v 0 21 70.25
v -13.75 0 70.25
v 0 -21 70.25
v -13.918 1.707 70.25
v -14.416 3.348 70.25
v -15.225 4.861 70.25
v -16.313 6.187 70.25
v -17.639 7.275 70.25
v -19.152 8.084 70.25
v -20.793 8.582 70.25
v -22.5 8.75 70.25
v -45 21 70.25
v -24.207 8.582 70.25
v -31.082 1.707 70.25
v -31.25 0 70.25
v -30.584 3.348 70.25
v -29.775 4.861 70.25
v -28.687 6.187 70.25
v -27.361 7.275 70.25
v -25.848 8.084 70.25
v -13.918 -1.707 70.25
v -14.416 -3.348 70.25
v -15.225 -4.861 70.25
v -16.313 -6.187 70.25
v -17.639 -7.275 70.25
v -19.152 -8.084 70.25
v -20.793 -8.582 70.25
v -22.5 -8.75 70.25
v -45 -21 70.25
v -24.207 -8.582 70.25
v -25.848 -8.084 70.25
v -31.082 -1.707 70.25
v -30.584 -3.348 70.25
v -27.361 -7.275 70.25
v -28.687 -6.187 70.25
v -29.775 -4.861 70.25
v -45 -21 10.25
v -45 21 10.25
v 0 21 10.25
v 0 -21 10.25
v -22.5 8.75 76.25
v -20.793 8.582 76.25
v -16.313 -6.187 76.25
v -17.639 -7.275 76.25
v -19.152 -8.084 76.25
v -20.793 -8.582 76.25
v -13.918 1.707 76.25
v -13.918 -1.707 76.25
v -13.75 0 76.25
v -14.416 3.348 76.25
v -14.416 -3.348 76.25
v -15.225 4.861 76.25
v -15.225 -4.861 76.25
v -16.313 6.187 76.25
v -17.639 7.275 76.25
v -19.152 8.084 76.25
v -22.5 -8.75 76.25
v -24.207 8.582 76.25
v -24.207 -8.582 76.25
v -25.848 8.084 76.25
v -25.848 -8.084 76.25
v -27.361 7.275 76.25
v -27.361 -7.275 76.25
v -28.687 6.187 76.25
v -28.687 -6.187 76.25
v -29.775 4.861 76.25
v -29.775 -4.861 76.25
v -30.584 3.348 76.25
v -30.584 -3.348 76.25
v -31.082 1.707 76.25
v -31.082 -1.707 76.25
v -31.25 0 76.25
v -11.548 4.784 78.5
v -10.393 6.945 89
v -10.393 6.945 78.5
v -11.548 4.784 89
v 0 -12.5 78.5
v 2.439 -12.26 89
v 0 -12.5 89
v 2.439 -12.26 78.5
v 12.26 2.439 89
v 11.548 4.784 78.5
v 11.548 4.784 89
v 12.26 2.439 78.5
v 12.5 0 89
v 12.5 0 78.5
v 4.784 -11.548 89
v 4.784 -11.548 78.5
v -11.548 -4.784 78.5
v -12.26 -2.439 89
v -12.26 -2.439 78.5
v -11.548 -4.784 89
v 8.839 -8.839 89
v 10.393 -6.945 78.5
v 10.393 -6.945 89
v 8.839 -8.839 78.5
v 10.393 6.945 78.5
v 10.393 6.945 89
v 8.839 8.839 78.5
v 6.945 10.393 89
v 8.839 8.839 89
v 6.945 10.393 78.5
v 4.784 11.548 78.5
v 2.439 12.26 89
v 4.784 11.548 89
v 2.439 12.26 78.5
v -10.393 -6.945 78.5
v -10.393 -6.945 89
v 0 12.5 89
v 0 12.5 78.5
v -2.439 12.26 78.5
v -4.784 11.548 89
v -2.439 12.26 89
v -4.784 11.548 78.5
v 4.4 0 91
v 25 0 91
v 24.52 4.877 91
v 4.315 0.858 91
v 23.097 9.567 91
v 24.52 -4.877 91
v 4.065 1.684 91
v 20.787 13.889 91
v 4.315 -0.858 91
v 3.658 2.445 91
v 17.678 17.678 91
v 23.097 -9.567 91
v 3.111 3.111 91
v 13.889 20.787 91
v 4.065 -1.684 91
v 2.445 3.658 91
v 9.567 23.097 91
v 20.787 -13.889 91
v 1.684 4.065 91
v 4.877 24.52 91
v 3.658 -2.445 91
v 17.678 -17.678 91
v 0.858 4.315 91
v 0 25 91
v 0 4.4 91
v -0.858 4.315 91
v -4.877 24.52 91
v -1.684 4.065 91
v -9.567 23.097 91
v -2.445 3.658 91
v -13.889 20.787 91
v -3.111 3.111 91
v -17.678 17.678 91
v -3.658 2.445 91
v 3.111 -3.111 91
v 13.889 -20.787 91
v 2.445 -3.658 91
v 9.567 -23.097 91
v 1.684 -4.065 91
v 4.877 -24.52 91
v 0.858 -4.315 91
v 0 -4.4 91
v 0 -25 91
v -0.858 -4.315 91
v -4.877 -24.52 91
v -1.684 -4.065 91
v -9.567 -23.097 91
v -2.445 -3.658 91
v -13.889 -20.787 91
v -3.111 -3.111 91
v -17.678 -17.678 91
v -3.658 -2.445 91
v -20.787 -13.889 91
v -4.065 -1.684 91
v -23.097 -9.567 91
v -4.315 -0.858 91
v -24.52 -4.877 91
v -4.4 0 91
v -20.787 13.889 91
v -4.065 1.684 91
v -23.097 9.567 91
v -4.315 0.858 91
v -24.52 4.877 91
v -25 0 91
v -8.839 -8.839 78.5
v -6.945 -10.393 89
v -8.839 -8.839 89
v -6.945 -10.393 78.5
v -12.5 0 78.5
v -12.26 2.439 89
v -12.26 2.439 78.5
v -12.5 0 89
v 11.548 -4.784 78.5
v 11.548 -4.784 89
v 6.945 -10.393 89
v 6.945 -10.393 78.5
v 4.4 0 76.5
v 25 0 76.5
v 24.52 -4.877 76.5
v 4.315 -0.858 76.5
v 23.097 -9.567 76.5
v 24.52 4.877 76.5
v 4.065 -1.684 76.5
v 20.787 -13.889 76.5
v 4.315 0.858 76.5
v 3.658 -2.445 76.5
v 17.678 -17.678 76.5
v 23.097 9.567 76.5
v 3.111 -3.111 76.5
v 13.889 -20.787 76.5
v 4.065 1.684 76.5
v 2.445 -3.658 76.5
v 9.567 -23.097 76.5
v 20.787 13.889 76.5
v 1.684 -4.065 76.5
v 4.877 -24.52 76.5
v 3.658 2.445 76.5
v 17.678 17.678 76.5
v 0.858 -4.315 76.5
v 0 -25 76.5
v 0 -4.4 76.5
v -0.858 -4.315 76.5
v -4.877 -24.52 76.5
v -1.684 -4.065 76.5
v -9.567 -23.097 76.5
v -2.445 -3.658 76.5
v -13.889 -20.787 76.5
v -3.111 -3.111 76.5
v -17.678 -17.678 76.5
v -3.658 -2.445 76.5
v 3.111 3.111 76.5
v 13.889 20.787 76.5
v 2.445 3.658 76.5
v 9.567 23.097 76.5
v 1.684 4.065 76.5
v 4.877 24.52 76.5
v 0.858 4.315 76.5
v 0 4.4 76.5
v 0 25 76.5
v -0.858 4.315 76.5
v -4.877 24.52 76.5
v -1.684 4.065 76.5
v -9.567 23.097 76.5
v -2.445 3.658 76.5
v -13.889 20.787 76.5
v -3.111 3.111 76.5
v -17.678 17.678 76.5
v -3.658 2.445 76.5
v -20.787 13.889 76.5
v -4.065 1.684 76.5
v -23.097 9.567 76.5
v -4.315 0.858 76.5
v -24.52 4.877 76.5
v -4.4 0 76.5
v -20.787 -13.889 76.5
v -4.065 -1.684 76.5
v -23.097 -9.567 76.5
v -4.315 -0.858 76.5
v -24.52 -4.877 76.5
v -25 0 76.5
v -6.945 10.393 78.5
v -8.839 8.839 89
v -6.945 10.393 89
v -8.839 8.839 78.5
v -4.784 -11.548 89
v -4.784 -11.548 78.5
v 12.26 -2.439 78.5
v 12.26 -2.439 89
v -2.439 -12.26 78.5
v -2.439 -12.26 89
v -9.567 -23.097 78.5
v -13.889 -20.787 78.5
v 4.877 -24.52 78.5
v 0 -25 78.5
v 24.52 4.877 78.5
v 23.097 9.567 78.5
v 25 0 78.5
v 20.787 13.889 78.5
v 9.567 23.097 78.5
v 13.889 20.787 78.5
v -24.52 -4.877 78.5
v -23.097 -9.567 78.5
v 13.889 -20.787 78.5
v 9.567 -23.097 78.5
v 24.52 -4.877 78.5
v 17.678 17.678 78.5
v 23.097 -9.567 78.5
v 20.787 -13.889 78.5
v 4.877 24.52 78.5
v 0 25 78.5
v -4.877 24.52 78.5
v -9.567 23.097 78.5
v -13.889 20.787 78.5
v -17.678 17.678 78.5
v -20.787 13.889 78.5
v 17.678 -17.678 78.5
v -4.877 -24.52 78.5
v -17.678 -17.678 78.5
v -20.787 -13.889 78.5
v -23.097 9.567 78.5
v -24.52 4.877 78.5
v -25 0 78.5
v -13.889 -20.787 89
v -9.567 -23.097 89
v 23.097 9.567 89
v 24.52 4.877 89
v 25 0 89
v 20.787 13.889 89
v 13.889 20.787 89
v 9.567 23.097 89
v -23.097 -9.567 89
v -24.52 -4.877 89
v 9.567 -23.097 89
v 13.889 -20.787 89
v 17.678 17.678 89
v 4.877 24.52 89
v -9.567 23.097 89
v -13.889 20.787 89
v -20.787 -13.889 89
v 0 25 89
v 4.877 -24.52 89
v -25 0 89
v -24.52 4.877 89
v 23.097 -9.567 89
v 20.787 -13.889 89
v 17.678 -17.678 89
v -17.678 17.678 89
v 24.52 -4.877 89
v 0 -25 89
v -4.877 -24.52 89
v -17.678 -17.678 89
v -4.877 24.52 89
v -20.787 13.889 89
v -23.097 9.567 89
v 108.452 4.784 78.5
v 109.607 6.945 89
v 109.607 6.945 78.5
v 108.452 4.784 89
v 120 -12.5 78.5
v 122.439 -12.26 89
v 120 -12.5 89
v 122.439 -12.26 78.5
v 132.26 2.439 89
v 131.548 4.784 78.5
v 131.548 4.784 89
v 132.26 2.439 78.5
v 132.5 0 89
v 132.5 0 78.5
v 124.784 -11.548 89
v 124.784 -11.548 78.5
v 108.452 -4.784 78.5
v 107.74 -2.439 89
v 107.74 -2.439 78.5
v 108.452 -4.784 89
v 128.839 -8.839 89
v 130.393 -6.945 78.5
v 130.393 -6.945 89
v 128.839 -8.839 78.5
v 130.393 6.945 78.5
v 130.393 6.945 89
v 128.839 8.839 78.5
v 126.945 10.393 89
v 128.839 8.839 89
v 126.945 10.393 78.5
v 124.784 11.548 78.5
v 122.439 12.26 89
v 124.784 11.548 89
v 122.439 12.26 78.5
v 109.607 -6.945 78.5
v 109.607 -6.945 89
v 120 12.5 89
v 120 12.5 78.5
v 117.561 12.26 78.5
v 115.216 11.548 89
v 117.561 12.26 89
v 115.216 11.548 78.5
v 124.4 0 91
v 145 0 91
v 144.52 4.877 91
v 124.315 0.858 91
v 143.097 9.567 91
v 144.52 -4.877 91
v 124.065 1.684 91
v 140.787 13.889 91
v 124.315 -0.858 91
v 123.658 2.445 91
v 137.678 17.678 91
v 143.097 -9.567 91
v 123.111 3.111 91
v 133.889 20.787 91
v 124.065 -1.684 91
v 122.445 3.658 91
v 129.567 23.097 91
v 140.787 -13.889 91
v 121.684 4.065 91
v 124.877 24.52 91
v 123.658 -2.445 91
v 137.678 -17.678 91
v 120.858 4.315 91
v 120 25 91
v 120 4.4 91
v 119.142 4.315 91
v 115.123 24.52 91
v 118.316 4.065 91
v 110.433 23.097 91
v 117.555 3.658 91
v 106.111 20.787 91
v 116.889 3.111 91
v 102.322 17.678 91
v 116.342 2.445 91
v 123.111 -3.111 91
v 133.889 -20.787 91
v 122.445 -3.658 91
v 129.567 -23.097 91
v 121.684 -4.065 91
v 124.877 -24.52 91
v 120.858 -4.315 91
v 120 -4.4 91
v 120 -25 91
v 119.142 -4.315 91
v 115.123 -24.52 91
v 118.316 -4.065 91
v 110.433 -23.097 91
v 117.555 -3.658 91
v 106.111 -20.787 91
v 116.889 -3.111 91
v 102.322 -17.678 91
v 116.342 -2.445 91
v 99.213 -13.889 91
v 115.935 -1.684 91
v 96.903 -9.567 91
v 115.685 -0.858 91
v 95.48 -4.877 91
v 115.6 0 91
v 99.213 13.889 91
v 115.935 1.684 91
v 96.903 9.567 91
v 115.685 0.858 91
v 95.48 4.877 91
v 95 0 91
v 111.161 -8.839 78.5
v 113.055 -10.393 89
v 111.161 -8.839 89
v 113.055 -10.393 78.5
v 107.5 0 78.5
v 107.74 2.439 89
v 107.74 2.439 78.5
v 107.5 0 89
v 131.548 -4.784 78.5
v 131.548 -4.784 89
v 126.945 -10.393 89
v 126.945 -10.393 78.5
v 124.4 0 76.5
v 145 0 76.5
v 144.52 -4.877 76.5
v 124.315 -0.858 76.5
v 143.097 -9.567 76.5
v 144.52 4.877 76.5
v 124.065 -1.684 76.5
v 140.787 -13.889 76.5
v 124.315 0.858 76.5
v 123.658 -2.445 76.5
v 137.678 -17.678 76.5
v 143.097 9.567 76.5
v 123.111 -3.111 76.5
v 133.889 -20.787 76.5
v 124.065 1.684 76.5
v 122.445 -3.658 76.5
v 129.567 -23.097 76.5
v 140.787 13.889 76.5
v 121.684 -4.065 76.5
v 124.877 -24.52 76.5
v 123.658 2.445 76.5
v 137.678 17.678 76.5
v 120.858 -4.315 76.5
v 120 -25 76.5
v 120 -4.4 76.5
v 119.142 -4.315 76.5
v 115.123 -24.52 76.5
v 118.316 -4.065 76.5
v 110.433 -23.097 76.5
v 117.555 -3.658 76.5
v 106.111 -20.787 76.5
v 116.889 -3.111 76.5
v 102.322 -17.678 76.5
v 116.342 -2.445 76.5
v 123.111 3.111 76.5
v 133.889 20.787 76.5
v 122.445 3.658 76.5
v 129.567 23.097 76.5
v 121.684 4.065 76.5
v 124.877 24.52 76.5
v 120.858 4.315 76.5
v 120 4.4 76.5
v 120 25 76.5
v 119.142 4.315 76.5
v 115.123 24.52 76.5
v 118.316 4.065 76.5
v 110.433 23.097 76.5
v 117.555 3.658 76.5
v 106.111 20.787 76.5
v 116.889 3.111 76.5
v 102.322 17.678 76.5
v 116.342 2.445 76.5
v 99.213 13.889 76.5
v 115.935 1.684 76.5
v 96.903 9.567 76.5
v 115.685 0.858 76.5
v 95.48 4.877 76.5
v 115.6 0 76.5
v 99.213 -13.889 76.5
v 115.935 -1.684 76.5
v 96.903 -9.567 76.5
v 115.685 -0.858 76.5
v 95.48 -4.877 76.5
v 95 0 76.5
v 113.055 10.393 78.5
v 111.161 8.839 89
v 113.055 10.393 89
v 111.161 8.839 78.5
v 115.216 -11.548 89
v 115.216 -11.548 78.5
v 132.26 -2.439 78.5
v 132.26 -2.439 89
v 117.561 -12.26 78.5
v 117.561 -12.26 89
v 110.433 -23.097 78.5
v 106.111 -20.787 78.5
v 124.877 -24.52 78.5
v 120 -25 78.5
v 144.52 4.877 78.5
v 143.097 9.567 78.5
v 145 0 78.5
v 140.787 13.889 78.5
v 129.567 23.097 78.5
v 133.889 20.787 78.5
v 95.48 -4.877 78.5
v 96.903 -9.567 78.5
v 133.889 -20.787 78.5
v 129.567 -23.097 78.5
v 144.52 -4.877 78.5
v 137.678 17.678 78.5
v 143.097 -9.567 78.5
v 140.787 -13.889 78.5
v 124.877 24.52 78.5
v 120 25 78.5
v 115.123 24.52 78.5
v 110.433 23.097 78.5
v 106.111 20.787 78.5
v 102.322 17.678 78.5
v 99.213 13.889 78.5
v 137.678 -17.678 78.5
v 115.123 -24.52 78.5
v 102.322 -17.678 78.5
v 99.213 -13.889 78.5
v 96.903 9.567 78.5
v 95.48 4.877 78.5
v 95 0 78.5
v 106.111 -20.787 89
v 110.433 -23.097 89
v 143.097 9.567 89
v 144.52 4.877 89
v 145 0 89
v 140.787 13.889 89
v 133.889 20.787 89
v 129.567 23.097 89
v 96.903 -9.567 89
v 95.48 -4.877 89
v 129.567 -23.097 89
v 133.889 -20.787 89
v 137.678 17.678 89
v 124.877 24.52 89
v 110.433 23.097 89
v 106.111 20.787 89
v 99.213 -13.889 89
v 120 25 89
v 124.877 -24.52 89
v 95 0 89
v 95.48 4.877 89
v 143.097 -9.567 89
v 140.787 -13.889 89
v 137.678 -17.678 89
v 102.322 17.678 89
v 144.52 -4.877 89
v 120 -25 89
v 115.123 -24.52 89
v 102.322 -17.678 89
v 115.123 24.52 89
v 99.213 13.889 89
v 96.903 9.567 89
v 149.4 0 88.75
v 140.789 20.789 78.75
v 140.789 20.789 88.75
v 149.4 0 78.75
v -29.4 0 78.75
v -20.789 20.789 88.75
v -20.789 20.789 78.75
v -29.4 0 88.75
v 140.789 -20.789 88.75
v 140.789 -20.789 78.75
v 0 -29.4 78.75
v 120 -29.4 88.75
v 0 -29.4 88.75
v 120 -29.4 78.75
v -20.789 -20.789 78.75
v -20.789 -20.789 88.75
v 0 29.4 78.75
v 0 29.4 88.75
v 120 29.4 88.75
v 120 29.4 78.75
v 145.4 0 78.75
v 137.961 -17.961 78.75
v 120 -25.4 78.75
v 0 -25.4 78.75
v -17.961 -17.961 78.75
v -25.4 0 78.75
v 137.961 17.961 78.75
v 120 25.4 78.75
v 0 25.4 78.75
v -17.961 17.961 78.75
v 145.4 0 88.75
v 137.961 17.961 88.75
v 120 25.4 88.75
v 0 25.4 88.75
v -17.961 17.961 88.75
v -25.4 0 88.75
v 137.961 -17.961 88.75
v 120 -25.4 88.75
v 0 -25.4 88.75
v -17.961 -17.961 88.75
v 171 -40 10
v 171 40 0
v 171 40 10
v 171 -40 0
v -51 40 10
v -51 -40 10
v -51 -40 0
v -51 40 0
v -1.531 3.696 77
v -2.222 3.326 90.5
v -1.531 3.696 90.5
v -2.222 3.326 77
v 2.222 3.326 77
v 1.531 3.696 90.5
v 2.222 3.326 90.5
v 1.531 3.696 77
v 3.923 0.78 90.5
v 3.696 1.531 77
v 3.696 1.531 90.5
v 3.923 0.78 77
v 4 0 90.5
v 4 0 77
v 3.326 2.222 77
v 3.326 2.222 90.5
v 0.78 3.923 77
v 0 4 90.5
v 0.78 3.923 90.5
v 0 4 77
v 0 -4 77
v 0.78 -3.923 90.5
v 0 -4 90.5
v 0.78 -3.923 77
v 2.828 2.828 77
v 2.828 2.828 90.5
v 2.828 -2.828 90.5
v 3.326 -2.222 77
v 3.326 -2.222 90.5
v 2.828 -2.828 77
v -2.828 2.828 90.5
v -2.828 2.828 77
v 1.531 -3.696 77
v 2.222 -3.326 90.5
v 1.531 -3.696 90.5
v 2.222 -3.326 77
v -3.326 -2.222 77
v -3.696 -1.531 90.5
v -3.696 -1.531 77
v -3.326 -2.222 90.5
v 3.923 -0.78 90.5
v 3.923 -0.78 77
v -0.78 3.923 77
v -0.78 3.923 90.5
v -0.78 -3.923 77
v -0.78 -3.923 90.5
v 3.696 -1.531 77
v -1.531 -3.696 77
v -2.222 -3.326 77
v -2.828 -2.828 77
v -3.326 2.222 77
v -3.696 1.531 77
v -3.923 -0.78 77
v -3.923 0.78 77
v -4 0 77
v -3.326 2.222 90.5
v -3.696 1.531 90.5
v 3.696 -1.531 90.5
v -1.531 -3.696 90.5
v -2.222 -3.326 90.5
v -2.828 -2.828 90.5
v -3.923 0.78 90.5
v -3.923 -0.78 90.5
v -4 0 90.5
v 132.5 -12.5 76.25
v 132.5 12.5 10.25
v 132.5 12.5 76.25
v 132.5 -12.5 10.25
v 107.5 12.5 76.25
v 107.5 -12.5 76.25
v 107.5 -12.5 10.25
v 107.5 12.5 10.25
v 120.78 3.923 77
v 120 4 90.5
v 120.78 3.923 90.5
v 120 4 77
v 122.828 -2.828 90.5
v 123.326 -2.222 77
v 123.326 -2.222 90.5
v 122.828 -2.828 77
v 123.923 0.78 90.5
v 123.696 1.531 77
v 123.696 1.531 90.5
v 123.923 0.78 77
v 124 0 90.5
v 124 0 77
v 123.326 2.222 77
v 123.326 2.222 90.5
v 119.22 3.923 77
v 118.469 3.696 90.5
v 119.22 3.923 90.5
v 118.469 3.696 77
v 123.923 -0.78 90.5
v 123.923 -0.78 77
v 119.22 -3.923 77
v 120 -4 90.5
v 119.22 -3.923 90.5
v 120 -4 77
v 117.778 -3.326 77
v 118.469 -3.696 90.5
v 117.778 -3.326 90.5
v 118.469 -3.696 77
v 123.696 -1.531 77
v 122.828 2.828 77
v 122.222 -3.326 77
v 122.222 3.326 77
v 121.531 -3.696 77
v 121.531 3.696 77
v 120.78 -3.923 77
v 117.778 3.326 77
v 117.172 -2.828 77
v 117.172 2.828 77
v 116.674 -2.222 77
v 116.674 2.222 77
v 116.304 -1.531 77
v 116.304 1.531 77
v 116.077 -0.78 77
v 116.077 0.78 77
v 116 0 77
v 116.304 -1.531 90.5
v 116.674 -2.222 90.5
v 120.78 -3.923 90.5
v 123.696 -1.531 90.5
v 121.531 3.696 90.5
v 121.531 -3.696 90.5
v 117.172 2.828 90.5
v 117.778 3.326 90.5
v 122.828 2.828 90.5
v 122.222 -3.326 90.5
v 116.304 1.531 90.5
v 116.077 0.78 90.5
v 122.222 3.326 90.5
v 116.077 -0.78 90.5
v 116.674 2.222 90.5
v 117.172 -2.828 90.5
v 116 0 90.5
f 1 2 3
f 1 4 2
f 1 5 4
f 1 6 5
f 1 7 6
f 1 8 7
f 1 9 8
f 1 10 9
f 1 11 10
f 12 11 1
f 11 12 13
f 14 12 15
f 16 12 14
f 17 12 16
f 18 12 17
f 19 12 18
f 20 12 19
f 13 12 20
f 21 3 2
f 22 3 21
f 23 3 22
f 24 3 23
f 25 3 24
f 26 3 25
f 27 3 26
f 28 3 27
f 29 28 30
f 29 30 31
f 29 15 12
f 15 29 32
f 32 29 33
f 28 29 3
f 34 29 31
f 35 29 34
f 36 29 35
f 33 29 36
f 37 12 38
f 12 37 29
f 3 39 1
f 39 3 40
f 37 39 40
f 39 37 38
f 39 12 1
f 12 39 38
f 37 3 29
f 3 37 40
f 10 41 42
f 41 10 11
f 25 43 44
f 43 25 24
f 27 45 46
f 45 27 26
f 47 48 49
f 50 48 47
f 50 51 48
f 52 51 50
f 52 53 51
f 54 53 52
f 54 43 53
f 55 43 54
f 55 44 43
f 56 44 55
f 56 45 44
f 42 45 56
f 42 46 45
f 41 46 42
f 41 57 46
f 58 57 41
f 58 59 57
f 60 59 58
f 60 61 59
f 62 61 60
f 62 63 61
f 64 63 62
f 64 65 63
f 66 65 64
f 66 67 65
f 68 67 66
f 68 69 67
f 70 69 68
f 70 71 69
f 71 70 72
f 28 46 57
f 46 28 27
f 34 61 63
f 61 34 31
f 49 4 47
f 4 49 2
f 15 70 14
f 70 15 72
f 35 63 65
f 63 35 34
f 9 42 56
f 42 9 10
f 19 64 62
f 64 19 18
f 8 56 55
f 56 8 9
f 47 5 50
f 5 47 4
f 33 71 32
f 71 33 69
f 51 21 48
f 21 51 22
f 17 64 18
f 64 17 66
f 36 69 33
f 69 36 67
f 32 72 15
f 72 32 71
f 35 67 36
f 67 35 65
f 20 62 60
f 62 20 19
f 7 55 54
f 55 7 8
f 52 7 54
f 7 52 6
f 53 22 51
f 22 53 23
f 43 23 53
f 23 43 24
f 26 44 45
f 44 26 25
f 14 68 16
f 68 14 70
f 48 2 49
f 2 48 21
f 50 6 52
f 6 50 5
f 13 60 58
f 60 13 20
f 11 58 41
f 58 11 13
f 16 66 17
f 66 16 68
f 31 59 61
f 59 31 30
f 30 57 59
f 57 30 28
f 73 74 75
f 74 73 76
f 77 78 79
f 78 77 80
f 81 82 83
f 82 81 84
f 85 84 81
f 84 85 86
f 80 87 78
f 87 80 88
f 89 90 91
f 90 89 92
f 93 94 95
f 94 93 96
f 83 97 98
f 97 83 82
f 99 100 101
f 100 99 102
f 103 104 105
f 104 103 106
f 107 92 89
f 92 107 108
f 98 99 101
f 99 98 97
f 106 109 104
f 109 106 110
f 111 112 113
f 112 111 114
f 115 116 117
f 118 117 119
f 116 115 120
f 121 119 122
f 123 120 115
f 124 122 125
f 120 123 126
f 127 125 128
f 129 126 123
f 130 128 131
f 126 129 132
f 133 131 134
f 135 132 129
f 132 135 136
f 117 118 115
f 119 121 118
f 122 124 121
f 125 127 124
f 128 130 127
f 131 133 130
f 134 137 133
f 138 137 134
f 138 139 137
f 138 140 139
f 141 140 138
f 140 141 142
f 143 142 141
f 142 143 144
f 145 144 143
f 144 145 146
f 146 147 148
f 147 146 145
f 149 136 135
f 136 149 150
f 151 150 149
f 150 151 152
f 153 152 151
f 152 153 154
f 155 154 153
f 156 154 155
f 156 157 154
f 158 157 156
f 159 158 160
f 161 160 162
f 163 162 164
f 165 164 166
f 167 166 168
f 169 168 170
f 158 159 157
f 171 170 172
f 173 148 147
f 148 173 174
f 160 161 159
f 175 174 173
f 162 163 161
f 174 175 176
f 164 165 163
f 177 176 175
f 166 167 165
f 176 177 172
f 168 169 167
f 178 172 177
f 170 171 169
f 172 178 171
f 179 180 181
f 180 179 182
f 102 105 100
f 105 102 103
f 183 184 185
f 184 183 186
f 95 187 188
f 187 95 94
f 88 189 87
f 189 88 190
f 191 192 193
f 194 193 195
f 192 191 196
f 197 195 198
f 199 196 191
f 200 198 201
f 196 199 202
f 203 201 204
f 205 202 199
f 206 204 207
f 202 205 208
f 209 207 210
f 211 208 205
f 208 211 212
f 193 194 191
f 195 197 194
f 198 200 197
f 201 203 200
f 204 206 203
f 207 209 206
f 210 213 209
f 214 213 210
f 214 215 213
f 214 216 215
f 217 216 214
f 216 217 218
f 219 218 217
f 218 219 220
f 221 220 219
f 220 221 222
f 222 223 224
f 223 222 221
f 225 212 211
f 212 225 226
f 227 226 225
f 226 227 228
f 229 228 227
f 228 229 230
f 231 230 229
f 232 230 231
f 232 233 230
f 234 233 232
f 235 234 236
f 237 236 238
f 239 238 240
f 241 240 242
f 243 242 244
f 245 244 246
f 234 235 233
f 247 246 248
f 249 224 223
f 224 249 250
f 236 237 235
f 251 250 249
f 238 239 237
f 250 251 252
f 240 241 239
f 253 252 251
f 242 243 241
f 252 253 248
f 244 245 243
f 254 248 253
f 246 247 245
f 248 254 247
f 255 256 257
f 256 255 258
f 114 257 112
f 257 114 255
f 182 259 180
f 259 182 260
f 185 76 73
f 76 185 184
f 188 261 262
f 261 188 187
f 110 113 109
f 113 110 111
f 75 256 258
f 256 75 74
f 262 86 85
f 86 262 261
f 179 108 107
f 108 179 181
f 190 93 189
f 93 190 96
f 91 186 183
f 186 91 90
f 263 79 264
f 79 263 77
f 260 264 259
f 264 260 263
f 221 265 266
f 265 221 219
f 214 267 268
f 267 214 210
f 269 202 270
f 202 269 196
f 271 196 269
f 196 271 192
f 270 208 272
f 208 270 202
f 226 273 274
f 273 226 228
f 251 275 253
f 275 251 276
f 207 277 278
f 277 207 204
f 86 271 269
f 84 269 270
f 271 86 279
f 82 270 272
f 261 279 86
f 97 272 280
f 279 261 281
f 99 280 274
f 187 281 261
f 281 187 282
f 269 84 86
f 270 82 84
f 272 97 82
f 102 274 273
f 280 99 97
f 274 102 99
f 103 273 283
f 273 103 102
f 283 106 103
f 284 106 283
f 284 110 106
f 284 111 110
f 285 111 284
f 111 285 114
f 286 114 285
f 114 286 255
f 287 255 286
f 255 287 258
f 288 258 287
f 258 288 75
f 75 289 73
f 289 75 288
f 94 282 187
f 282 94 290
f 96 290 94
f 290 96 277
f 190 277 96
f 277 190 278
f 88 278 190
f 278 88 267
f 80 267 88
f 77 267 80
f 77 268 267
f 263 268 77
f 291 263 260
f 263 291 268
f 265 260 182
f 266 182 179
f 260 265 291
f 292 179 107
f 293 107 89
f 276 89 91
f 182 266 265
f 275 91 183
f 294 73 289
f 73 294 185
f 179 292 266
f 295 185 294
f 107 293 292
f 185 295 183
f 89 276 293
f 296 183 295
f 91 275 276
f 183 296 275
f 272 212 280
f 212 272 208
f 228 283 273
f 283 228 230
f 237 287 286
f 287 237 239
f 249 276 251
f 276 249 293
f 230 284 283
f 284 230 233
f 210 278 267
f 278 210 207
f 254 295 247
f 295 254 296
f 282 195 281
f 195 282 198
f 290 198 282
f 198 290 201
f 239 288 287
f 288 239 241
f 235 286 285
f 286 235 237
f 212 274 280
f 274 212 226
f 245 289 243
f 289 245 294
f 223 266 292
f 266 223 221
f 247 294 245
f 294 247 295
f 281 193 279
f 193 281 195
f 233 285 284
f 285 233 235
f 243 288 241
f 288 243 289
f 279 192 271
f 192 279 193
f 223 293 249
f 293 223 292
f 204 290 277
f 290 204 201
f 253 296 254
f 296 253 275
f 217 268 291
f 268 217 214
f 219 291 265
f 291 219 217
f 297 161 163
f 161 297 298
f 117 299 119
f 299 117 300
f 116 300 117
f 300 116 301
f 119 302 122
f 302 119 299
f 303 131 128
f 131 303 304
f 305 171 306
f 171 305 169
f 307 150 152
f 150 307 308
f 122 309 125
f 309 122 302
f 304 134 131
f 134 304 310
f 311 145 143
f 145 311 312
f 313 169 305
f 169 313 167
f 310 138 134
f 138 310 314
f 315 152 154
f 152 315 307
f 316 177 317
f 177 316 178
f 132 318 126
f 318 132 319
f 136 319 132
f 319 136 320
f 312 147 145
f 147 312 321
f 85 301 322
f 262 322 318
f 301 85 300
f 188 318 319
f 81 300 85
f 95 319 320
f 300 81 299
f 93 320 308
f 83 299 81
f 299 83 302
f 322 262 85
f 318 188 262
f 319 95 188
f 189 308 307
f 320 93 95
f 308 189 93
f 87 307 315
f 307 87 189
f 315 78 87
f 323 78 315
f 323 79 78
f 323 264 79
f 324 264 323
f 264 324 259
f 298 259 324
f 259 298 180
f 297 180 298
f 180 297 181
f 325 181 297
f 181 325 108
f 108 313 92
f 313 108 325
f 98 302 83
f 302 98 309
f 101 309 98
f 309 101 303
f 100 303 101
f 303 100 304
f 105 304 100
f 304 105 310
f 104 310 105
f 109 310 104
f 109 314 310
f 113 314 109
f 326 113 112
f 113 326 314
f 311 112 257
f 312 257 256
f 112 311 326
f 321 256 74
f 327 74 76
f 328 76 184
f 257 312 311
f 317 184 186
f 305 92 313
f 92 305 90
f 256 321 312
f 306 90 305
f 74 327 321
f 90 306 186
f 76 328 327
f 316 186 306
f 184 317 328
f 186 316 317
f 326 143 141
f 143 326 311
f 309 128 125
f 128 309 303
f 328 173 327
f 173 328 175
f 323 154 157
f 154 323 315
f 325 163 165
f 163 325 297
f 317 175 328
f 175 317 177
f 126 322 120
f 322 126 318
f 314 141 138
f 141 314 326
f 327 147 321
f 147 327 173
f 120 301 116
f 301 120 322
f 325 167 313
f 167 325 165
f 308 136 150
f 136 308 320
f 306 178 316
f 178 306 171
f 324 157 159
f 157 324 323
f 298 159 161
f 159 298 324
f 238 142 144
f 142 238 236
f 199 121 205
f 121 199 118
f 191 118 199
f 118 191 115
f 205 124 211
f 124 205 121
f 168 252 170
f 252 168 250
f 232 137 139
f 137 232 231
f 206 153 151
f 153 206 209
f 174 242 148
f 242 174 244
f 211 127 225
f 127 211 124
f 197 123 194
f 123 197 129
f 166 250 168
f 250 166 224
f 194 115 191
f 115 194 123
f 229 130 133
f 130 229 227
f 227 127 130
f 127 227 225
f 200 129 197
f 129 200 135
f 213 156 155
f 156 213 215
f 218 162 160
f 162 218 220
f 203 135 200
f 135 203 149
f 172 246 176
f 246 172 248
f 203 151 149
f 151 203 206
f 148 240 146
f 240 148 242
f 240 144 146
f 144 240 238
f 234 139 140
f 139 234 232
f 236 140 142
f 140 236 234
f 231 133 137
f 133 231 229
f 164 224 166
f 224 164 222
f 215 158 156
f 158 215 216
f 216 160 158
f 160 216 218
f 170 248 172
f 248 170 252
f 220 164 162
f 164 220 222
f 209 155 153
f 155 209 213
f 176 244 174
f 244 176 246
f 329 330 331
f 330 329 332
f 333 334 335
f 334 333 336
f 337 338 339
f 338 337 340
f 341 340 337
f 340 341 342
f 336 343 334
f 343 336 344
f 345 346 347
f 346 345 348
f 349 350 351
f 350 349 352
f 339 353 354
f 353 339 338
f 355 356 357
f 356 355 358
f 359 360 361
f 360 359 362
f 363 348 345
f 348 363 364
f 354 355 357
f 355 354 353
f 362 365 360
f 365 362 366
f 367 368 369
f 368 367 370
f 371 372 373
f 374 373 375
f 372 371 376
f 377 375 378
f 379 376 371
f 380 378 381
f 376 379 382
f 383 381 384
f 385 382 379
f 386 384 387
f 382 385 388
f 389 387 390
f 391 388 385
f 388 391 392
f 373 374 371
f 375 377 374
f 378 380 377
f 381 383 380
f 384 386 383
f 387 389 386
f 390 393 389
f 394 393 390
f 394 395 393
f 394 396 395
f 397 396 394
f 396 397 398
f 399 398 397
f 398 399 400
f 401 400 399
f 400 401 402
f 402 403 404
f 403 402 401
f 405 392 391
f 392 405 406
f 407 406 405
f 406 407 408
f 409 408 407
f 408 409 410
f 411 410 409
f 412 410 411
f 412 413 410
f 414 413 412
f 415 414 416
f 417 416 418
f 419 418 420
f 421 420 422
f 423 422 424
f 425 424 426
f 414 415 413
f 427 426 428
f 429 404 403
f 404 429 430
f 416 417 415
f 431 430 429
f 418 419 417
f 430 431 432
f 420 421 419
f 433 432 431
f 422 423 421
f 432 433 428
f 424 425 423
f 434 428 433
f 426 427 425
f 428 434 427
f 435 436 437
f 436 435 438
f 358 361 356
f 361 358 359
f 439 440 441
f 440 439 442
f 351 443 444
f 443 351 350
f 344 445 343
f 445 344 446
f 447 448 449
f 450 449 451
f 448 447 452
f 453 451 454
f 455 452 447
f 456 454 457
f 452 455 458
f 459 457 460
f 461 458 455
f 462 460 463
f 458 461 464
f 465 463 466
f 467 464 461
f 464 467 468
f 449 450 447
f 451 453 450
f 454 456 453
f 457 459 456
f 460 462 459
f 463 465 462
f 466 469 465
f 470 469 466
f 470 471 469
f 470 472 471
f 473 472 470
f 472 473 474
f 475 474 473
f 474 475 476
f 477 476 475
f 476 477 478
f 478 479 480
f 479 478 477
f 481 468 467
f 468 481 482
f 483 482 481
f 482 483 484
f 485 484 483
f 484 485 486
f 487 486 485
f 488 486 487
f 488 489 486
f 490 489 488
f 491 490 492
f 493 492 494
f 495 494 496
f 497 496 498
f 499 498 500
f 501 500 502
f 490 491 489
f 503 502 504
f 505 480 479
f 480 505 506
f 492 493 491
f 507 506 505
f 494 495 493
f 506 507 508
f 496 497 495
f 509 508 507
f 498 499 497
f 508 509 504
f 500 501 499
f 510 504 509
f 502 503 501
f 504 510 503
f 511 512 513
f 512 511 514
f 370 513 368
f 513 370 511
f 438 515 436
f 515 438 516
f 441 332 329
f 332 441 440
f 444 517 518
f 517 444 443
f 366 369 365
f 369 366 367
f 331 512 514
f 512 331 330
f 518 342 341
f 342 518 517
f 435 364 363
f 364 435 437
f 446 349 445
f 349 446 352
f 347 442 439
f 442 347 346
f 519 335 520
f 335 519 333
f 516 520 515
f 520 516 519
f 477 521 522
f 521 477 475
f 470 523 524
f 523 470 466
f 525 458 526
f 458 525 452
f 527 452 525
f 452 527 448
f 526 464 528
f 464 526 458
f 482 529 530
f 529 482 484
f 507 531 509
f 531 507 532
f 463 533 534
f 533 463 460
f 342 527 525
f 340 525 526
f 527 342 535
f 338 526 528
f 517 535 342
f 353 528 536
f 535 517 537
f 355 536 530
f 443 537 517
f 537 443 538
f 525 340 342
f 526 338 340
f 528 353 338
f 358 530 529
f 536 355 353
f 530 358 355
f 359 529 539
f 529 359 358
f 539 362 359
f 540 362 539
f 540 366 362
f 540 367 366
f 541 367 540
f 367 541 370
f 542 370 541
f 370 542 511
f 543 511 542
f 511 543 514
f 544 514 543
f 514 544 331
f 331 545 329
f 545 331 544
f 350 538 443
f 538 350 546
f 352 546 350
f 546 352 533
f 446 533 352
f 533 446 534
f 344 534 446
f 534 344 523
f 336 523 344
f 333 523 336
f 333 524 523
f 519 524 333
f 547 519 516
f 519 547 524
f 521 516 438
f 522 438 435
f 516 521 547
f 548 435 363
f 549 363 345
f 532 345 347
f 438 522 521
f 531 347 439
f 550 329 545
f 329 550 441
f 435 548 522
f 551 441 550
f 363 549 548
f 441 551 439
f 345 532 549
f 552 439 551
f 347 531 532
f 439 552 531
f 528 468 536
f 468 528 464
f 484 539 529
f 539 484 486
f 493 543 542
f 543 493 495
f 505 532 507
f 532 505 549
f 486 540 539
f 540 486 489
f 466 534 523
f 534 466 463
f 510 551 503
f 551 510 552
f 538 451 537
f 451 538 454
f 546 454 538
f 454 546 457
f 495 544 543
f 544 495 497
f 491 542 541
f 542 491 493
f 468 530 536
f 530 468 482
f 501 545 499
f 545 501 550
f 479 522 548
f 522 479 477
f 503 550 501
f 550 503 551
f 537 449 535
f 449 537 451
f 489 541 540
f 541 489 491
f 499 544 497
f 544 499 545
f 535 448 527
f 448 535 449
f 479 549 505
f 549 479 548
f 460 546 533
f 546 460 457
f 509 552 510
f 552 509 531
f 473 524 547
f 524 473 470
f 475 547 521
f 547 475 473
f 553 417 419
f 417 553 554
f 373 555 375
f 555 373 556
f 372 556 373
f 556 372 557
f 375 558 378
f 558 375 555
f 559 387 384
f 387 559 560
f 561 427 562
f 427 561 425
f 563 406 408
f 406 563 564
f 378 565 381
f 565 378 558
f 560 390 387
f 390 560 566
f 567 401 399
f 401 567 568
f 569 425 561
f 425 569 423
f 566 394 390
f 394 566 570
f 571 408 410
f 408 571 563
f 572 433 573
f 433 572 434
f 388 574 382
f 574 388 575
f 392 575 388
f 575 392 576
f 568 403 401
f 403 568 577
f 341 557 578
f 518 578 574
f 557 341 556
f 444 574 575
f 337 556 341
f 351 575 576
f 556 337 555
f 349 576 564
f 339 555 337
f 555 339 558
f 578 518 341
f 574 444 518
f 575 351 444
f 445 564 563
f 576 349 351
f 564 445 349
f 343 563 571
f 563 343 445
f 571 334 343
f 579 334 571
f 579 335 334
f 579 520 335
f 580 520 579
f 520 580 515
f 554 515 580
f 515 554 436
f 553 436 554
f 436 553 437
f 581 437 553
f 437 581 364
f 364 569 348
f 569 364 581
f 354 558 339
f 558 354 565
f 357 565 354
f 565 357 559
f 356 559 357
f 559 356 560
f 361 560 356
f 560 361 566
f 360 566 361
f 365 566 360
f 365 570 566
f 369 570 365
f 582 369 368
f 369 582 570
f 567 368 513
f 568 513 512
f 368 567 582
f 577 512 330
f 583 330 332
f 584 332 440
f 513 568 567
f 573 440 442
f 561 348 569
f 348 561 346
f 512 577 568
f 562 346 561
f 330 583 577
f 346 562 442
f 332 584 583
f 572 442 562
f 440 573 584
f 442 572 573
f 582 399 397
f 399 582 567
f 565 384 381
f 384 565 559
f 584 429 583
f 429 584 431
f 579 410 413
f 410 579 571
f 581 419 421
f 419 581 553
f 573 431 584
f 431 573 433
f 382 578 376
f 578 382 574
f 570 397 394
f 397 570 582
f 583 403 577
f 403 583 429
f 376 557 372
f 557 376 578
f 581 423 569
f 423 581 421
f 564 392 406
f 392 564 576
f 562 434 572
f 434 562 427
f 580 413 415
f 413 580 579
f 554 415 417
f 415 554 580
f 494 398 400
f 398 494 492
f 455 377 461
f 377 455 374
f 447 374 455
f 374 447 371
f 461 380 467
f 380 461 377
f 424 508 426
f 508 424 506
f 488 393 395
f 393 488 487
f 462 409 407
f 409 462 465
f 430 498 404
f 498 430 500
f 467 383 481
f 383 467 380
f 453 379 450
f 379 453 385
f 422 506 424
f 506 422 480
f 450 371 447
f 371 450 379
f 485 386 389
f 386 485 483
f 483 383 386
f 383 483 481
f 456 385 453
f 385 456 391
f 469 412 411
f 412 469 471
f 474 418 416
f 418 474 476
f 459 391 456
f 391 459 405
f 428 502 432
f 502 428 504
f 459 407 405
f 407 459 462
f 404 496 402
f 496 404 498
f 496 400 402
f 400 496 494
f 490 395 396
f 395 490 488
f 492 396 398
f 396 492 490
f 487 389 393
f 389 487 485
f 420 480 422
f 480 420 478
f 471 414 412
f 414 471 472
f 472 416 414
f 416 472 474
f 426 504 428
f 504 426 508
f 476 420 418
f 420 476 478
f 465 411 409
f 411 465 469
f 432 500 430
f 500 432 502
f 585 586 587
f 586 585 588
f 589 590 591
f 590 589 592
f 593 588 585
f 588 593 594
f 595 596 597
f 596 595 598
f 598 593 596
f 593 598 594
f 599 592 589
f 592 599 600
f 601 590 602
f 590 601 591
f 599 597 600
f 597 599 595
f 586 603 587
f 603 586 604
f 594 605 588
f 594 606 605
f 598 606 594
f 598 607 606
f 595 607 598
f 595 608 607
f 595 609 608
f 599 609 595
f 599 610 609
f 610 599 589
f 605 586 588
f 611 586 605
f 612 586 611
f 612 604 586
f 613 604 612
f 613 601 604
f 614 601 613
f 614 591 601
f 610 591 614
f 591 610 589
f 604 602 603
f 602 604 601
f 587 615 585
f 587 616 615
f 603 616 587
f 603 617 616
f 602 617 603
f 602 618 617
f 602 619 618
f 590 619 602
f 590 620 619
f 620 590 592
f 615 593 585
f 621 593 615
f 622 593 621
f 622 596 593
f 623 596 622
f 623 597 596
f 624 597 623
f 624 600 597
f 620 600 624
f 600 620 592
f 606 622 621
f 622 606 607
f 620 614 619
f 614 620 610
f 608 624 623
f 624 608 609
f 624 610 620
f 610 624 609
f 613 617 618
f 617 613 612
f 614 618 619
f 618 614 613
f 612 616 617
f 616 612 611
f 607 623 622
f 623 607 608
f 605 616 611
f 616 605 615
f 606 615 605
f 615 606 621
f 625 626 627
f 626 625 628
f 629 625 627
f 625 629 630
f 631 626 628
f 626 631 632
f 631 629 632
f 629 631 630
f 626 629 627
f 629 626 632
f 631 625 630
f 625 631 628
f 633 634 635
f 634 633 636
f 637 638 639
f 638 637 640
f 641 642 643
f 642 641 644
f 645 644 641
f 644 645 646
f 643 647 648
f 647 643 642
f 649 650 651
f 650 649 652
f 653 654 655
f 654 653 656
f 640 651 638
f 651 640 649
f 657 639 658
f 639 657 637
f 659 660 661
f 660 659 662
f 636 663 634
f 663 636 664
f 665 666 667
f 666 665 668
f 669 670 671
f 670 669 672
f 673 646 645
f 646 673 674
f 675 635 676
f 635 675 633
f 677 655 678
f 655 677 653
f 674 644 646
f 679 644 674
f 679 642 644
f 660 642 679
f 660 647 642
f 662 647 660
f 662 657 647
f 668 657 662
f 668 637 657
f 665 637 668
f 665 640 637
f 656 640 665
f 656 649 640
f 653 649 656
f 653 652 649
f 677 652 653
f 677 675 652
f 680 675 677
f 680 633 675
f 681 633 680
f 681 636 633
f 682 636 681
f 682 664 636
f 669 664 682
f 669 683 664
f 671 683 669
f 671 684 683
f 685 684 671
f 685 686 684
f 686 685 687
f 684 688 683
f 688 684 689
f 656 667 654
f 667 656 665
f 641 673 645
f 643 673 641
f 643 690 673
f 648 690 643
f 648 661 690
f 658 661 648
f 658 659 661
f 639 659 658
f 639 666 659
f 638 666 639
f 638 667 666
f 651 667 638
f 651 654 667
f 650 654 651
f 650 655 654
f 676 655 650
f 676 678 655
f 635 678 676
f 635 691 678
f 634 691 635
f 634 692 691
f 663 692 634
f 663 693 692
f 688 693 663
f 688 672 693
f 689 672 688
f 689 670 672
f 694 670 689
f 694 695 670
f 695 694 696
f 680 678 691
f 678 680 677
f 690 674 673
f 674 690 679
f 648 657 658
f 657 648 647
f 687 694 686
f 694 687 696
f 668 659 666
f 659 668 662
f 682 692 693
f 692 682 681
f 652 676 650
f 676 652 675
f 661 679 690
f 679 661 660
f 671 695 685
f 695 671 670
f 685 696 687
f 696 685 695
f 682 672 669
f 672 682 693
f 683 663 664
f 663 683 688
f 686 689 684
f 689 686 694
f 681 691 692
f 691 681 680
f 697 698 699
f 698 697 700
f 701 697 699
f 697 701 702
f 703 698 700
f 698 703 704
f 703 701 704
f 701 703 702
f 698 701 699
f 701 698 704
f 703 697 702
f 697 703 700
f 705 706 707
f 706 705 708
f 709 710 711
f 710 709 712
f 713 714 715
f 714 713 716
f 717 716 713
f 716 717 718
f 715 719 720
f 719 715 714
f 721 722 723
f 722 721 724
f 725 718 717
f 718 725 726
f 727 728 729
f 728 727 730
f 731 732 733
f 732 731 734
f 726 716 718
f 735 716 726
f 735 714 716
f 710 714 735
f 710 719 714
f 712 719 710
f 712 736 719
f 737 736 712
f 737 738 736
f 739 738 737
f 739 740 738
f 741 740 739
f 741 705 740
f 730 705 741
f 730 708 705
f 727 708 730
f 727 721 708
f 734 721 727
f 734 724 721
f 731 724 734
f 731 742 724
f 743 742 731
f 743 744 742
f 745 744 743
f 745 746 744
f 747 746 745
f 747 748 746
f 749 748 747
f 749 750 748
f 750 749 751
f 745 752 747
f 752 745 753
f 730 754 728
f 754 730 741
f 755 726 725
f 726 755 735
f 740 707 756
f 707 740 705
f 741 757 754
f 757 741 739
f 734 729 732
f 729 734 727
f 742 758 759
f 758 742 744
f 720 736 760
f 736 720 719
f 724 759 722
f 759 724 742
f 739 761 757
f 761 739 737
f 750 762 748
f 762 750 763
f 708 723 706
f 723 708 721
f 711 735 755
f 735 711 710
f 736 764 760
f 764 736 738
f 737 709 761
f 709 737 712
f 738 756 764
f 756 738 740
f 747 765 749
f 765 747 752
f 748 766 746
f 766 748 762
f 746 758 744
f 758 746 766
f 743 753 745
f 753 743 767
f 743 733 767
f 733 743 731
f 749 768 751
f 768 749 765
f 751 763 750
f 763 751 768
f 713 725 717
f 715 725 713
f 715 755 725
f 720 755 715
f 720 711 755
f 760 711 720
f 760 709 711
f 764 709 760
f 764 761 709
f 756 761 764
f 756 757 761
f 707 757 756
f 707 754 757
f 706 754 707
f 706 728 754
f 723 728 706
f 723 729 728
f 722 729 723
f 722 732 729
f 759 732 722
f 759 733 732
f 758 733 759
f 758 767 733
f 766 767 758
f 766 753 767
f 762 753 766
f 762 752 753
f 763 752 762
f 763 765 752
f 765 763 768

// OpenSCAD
$fn = 32;

// ------------------------------------------------------------------------
// Motor belt drive: span 120 mm, pulleys d50, belt 10 mm wide
// Every part is its own module, assembly() places every instance.
// ------------------------------------------------------------------------

// --- part 1 ---
module base_plate() {
  difference() {
    translate([-111, -40, 0]) cube([222, 80, 10]);
  }
}

// --- part 2 ---
module motor() {
  union() {
    translate([-30, -21, 0]) cube([60, 42, 45]);
    translate([33, 0, 22.5]) rotate([0, 90, 0]) cylinder(h = 6, d = 17.5, center = true);
  }
}

// --- part 3 ---
module drive_shaft() {
  translate([0, 0, -6.75]) cylinder(h = 13.5, d = 8);
}

// --- part 4 ---
module pulley_drive() {
  difference() {
    union() {
      cylinder(h = 14.5, d = 25);
      cylinder(h = 2, d = 50);
      translate([0, 0, 12.5]) cylinder(h = 2, d = 50);
    }
    translate([0, 0, -1]) cylinder(h = 16.5, d = 8.8);
  }
}

// --- part 5 ---
module idler_post() {
  translate([-12.5, -12.5, 0]) cube([25, 25, 66]);
}

// --- part 6 ---
module driven_shaft() {
  translate([0, 0, -6.75]) cylinder(h = 13.5, d = 8);
}

// --- part 7 ---
module pulley_driven() {
  difference() {
    union() {
      cylinder(h = 14.5, d = 25);
      cylinder(h = 2, d = 50);
      translate([0, 0, 12.5]) cylinder(h = 2, d = 50);
    }
    translate([0, 0, -1]) cylinder(h = 16.5, d = 8.8);
  }
}

// --- part 8 ---
module drive_belt() {
  difference() {
    linear_extrude(height = 10) polygon(points = concat([for (a = [90 : 45 : 270]) [29.4 * cos(a), 29.4 * sin(a)]], [for (a = [270 : 45 : 450]) [120 + 29.4 * cos(a), 29.4 * sin(a)]]));
    translate([0, 0, -1]) linear_extrude(height = 12) polygon(points = concat([for (a = [90 : 45 : 270]) [25.4 * cos(a), 25.4 * sin(a)]], [for (a = [270 : 45 : 450]) [120 + 25.4 * cos(a), 25.4 * sin(a)]]));
  }
}

// --- assembly ---
module assembly() {
  color([0.80, 0.24, 0.20]) translate([60, 0, 0]) rotate([0, 0, 0]) base_plate();
  color([0.20, 0.45, 0.75]) translate([0, 0, 40.25]) rotate([0, 270, 0]) motor();
  color([0.25, 0.62, 0.32]) translate([0, 0, 83.75]) rotate([0, 0, 0]) drive_shaft();
  color([0.92, 0.70, 0.18]) translate([0, 0, 76.5]) rotate([0, 0, 0]) pulley_drive();
  color([0.58, 0.35, 0.70]) translate([120, 0, 10.25]) rotate([0, 0, 0]) idler_post();
  color([0.16, 0.66, 0.66]) translate([120, 0, 83.75]) rotate([0, 0, 0]) driven_shaft();
  color([0.85, 0.48, 0.18]) translate([120, 0, 76.5]) rotate([0, 0, 0]) pulley_driven();
  color([0.55, 0.60, 0.65]) translate([0, 0, 78.75]) rotate([0, 0, 0]) drive_belt();
}

assembly();
